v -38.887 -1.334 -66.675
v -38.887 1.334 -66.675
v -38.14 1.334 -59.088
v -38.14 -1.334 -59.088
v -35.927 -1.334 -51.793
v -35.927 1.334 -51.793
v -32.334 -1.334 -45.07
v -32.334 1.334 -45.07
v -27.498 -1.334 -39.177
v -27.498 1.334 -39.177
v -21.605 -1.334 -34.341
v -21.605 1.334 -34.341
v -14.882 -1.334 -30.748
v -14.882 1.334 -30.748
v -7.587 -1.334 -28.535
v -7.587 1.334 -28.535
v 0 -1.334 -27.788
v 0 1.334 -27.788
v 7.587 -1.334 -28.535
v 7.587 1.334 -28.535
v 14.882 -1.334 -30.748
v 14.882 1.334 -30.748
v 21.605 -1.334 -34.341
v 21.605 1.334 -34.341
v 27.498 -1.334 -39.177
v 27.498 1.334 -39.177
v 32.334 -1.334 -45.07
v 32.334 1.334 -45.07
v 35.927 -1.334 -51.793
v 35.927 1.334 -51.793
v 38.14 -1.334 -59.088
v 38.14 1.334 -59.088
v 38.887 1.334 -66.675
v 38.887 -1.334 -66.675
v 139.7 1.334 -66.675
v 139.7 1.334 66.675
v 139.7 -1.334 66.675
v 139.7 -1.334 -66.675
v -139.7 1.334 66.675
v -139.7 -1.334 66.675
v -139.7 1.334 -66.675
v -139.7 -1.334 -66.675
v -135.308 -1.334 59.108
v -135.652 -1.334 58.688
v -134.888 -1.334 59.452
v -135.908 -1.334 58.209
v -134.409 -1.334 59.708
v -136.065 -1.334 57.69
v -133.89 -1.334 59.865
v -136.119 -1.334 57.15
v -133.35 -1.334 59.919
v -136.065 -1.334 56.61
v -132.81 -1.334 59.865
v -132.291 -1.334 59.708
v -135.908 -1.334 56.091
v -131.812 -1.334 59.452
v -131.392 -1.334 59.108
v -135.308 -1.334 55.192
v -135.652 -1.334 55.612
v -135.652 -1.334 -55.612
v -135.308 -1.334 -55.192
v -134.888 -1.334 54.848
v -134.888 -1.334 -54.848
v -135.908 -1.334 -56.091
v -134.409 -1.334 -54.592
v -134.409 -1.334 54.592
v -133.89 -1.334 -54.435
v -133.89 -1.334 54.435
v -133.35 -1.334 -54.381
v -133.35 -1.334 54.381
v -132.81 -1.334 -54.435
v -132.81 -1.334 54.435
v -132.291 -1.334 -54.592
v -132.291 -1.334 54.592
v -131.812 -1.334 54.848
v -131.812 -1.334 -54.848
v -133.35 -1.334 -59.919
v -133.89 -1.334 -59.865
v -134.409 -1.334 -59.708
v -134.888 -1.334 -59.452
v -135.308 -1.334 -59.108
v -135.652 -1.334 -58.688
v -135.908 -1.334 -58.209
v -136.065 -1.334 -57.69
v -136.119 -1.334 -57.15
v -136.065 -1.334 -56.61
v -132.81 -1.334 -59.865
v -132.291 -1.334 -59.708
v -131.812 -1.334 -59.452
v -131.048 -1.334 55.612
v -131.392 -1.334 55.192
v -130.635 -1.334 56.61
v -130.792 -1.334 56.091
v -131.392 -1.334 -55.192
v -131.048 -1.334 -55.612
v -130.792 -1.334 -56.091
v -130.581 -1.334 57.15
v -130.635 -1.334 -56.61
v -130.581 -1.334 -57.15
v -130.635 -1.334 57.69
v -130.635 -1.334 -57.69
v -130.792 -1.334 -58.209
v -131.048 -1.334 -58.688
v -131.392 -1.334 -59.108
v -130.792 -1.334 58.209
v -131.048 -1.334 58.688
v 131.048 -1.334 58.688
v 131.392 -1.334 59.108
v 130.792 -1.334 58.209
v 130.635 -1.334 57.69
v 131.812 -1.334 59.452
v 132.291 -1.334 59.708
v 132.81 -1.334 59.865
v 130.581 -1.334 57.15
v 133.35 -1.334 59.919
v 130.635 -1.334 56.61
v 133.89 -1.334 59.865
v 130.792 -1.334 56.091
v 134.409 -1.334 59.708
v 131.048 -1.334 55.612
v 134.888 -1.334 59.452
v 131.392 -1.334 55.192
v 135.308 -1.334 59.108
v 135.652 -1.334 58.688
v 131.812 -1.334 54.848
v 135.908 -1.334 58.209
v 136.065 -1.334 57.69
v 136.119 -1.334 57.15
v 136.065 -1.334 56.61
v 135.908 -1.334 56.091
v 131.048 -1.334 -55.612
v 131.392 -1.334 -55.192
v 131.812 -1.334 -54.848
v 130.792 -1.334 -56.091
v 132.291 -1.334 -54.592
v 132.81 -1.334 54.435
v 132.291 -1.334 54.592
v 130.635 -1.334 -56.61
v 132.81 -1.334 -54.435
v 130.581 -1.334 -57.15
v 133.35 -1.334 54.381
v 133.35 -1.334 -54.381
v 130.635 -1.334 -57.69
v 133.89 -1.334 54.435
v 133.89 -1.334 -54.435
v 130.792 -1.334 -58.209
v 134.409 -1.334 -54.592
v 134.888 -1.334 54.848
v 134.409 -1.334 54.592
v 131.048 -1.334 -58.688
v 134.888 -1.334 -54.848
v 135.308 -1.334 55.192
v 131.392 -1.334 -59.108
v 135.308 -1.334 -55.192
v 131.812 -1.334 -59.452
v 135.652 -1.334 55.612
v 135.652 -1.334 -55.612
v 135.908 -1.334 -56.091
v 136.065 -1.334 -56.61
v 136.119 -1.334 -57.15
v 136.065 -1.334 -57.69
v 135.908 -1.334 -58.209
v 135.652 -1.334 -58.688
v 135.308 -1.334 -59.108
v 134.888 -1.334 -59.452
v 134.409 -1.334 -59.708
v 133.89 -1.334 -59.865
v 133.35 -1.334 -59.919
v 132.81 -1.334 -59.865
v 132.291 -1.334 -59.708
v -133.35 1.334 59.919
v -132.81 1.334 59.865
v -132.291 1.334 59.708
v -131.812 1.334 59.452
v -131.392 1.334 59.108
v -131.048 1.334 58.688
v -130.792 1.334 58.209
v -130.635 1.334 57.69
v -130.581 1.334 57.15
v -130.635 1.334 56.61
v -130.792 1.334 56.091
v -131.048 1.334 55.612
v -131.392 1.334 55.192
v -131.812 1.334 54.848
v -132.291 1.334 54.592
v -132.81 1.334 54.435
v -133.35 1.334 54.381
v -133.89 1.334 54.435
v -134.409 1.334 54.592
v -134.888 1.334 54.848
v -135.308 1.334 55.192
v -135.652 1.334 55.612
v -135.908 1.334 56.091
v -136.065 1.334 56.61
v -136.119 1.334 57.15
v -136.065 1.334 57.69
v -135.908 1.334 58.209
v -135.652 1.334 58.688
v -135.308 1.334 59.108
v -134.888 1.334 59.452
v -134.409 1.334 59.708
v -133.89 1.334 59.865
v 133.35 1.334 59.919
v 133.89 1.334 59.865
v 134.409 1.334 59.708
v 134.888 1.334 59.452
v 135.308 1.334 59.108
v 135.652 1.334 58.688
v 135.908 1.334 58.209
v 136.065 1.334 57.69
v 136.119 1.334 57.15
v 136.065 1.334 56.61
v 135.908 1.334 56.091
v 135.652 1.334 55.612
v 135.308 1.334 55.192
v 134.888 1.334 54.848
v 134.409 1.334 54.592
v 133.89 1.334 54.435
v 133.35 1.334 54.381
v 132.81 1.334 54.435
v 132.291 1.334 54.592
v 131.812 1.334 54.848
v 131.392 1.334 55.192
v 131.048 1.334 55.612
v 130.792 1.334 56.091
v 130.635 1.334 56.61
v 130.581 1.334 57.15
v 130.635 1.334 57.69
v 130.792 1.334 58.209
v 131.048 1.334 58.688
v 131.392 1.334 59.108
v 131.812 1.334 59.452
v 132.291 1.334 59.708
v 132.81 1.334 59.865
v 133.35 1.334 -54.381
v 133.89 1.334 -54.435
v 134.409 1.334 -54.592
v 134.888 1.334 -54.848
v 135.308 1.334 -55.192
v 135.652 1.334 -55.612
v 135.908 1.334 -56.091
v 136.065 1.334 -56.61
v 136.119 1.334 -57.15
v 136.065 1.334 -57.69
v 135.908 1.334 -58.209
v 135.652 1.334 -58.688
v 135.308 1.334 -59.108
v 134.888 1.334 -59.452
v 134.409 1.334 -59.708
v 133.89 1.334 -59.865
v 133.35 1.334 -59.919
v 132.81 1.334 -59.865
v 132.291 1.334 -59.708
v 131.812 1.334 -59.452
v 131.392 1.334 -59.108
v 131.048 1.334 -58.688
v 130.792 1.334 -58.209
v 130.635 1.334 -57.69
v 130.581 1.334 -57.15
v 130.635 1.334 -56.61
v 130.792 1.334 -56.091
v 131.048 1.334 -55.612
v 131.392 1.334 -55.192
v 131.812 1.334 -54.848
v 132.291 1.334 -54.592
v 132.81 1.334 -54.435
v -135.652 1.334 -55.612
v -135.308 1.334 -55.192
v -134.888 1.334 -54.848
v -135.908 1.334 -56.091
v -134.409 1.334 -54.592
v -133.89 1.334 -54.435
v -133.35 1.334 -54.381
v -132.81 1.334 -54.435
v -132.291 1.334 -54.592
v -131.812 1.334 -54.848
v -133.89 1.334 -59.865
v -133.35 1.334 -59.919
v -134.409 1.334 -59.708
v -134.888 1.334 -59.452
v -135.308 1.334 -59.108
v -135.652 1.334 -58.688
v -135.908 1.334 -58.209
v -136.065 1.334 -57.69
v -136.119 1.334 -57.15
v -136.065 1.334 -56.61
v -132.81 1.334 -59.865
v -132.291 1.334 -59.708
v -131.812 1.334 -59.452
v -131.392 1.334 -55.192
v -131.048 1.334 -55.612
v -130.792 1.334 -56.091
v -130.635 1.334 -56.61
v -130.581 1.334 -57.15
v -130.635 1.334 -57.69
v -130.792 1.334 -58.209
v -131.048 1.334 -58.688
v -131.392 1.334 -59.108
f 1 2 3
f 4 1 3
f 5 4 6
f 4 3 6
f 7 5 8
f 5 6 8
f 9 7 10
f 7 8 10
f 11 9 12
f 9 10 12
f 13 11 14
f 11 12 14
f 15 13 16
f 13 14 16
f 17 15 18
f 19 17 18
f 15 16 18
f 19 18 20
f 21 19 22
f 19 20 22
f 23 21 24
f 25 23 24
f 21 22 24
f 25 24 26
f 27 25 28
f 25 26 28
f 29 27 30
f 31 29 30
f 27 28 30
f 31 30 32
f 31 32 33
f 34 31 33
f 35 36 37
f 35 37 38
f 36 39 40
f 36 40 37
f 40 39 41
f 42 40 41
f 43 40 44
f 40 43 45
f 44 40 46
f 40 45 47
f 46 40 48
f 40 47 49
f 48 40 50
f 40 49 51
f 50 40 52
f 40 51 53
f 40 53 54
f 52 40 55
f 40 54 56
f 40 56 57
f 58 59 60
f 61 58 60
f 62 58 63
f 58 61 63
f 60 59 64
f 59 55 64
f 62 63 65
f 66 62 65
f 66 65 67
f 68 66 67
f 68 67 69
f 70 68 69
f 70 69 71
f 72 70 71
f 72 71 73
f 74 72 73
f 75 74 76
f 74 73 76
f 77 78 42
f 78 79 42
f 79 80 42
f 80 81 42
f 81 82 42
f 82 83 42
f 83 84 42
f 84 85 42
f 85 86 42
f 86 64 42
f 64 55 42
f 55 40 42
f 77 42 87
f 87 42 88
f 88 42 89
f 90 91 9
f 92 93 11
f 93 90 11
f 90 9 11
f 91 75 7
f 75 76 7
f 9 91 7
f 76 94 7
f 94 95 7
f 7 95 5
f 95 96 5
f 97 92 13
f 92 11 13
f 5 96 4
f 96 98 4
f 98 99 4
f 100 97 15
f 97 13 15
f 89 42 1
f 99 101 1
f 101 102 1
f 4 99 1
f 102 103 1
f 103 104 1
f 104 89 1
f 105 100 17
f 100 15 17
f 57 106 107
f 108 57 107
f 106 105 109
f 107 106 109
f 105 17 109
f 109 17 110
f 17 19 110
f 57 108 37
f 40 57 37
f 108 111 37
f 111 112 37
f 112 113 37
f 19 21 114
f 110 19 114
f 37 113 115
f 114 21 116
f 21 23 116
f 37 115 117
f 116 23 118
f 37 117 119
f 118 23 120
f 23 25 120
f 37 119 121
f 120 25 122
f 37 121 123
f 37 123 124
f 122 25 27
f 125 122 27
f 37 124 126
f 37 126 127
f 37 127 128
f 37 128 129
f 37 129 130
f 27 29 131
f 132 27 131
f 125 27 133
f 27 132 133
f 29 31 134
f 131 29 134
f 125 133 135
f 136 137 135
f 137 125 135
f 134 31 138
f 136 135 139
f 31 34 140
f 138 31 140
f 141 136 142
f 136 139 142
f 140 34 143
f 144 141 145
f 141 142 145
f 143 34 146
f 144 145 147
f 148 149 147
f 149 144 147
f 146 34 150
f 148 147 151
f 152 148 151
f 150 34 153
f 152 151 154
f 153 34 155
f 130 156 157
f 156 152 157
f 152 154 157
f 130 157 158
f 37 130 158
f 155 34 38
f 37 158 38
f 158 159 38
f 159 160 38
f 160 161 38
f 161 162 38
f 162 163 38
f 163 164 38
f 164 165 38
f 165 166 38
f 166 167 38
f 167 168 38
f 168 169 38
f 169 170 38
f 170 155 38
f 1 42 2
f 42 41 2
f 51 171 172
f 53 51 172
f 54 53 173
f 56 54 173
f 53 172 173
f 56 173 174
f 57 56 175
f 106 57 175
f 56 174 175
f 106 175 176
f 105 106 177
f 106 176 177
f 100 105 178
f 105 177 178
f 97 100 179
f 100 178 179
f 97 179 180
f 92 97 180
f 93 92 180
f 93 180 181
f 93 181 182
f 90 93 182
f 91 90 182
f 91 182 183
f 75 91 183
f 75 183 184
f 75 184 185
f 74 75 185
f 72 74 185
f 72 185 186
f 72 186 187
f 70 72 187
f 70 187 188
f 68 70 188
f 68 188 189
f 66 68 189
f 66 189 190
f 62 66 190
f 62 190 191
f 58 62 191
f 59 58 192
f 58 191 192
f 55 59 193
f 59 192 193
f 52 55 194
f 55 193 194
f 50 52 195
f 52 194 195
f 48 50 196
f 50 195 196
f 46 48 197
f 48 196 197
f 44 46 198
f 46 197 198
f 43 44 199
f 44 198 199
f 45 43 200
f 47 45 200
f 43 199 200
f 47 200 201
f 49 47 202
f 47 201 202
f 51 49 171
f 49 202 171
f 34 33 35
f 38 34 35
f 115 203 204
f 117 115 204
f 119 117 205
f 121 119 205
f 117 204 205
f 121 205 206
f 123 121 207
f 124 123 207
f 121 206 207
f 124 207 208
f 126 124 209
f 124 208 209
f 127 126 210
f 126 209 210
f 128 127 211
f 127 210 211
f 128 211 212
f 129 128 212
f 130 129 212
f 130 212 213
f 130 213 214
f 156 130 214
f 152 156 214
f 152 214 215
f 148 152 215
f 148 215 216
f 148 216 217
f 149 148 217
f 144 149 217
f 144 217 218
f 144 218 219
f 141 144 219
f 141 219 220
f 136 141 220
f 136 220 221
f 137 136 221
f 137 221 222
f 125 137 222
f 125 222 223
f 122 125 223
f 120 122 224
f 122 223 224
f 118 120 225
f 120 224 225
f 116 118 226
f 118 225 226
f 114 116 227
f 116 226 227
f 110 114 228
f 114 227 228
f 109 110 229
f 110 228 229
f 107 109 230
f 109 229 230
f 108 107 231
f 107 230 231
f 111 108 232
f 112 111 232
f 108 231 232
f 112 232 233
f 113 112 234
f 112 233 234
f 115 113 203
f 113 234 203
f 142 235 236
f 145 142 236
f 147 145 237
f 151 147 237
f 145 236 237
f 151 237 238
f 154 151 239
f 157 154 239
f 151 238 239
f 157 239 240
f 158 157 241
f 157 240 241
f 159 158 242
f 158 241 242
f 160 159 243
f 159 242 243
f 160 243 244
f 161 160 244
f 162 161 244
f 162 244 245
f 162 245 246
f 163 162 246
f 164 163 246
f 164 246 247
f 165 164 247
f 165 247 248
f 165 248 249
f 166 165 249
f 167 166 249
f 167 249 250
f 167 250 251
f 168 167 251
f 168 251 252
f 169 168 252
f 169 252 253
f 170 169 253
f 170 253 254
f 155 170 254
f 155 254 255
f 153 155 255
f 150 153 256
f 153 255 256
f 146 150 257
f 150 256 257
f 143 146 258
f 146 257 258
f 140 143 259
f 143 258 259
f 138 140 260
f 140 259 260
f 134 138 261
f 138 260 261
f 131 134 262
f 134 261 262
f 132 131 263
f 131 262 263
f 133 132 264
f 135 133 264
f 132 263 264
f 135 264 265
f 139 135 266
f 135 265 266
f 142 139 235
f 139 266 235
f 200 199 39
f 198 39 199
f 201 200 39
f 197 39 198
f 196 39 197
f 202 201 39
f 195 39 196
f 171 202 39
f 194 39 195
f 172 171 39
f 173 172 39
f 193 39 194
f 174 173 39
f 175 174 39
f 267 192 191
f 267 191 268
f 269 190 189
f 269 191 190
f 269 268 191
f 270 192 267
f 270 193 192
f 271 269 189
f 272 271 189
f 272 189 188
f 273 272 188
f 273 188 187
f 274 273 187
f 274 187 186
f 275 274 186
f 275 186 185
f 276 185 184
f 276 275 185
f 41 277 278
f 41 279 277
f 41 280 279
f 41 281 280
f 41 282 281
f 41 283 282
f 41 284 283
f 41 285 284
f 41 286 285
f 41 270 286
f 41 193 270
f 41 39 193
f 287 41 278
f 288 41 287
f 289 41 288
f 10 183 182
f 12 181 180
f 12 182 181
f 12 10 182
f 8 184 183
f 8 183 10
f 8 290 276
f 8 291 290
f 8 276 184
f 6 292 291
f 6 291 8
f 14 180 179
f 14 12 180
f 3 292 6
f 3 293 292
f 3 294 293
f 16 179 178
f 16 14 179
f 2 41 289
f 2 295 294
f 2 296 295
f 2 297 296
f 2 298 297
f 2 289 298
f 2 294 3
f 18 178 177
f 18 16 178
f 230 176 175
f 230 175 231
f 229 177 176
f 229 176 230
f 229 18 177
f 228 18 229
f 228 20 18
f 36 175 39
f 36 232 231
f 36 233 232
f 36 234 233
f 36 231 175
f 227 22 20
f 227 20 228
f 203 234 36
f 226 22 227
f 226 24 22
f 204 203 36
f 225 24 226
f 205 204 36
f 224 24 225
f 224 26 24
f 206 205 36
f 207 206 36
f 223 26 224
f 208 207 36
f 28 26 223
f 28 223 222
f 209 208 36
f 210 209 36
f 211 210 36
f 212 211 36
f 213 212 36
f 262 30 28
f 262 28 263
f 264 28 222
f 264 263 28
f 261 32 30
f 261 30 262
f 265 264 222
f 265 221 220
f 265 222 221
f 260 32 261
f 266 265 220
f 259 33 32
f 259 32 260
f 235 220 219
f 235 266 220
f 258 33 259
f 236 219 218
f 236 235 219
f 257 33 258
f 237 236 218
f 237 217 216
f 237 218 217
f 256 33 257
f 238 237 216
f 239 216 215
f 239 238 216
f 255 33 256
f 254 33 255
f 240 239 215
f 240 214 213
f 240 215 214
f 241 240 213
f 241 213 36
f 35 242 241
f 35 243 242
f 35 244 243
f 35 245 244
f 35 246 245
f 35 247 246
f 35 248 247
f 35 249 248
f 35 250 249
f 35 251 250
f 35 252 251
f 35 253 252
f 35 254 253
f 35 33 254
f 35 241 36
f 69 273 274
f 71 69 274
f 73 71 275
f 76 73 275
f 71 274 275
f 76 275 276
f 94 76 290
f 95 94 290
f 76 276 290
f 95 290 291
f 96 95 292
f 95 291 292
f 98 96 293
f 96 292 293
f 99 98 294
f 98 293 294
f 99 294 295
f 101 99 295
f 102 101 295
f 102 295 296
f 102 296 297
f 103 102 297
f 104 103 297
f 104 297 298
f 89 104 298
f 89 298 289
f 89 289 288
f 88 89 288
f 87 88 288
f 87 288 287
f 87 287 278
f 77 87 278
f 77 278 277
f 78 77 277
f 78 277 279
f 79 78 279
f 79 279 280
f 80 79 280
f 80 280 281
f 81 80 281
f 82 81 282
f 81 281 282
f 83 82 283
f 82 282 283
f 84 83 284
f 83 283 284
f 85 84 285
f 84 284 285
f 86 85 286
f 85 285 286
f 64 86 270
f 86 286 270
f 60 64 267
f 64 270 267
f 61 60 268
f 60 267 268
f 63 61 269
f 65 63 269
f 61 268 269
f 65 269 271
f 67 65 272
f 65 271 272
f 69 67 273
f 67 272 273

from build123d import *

# Parameters (mm, degrees)
SKETCH1_W           = 279.4
SKETCH1_H           = 133.35
BOSS_EXTRUDE1_DEPTH = 1.3335
CUT_EXTRUDE2_START  = 1.3335
SKETCH2_R           = 38.8874
CUT_EXTRUDE2_DEPTH  = 157.134739812
CUT_EXTRUDE4_START  = 1.3335
SKETCH3_R           = 2.7686
CUT_EXTRUDE4_DEPTH  = 157.134739812


with BuildPart() as part:
    # Sketch1 → Boss-Extrude1 (new, symmetric)
    with BuildSketch(Plane(origin=(0, 0, 0), x_dir=(1, 0, 0), z_dir=(0, 1, 0))):
        Rectangle(SKETCH1_W, SKETCH1_H)
    extrude(amount=BOSS_EXTRUDE1_DEPTH, both=True)

    # Sketch2 → Cut-Extrude2 (cut, through all)
    with BuildSketch(Plane(origin=(0, 0, 0), x_dir=(1, 0, 0), z_dir=(0, 1, 0)).offset(CUT_EXTRUDE2_START)):
        with Locations((0, 66.675)):
            Circle(SKETCH2_R)
    extrude(amount=-CUT_EXTRUDE2_DEPTH, mode=Mode.SUBTRACT)

    # Sketch3 → Cut-Extrude4 (cut, through all)
    with BuildSketch(Plane(origin=(0, 0, 0), x_dir=(1, 0, 0), z_dir=(0, 1, 0)).offset(CUT_EXTRUDE4_START)):
        with Locations(Location((-133.35, -57.15, 0), (0, 0, 270))):
            Circle(SKETCH3_R)
        with Locations(Location((133.35, -57.15, 0), (0, 0, 270))):
            Circle(SKETCH3_R)
        with Locations(Location((-133.35, 57.15, 0), (0, 0, 270))):
            Circle(SKETCH3_R)
        with Locations(Location((133.35, 57.15, 0), (0, 0, 270))):
            Circle(SKETCH3_R)
    extrude(amount=-CUT_EXTRUDE4_DEPTH, mode=Mode.SUBTRACT)


solid = part.part
